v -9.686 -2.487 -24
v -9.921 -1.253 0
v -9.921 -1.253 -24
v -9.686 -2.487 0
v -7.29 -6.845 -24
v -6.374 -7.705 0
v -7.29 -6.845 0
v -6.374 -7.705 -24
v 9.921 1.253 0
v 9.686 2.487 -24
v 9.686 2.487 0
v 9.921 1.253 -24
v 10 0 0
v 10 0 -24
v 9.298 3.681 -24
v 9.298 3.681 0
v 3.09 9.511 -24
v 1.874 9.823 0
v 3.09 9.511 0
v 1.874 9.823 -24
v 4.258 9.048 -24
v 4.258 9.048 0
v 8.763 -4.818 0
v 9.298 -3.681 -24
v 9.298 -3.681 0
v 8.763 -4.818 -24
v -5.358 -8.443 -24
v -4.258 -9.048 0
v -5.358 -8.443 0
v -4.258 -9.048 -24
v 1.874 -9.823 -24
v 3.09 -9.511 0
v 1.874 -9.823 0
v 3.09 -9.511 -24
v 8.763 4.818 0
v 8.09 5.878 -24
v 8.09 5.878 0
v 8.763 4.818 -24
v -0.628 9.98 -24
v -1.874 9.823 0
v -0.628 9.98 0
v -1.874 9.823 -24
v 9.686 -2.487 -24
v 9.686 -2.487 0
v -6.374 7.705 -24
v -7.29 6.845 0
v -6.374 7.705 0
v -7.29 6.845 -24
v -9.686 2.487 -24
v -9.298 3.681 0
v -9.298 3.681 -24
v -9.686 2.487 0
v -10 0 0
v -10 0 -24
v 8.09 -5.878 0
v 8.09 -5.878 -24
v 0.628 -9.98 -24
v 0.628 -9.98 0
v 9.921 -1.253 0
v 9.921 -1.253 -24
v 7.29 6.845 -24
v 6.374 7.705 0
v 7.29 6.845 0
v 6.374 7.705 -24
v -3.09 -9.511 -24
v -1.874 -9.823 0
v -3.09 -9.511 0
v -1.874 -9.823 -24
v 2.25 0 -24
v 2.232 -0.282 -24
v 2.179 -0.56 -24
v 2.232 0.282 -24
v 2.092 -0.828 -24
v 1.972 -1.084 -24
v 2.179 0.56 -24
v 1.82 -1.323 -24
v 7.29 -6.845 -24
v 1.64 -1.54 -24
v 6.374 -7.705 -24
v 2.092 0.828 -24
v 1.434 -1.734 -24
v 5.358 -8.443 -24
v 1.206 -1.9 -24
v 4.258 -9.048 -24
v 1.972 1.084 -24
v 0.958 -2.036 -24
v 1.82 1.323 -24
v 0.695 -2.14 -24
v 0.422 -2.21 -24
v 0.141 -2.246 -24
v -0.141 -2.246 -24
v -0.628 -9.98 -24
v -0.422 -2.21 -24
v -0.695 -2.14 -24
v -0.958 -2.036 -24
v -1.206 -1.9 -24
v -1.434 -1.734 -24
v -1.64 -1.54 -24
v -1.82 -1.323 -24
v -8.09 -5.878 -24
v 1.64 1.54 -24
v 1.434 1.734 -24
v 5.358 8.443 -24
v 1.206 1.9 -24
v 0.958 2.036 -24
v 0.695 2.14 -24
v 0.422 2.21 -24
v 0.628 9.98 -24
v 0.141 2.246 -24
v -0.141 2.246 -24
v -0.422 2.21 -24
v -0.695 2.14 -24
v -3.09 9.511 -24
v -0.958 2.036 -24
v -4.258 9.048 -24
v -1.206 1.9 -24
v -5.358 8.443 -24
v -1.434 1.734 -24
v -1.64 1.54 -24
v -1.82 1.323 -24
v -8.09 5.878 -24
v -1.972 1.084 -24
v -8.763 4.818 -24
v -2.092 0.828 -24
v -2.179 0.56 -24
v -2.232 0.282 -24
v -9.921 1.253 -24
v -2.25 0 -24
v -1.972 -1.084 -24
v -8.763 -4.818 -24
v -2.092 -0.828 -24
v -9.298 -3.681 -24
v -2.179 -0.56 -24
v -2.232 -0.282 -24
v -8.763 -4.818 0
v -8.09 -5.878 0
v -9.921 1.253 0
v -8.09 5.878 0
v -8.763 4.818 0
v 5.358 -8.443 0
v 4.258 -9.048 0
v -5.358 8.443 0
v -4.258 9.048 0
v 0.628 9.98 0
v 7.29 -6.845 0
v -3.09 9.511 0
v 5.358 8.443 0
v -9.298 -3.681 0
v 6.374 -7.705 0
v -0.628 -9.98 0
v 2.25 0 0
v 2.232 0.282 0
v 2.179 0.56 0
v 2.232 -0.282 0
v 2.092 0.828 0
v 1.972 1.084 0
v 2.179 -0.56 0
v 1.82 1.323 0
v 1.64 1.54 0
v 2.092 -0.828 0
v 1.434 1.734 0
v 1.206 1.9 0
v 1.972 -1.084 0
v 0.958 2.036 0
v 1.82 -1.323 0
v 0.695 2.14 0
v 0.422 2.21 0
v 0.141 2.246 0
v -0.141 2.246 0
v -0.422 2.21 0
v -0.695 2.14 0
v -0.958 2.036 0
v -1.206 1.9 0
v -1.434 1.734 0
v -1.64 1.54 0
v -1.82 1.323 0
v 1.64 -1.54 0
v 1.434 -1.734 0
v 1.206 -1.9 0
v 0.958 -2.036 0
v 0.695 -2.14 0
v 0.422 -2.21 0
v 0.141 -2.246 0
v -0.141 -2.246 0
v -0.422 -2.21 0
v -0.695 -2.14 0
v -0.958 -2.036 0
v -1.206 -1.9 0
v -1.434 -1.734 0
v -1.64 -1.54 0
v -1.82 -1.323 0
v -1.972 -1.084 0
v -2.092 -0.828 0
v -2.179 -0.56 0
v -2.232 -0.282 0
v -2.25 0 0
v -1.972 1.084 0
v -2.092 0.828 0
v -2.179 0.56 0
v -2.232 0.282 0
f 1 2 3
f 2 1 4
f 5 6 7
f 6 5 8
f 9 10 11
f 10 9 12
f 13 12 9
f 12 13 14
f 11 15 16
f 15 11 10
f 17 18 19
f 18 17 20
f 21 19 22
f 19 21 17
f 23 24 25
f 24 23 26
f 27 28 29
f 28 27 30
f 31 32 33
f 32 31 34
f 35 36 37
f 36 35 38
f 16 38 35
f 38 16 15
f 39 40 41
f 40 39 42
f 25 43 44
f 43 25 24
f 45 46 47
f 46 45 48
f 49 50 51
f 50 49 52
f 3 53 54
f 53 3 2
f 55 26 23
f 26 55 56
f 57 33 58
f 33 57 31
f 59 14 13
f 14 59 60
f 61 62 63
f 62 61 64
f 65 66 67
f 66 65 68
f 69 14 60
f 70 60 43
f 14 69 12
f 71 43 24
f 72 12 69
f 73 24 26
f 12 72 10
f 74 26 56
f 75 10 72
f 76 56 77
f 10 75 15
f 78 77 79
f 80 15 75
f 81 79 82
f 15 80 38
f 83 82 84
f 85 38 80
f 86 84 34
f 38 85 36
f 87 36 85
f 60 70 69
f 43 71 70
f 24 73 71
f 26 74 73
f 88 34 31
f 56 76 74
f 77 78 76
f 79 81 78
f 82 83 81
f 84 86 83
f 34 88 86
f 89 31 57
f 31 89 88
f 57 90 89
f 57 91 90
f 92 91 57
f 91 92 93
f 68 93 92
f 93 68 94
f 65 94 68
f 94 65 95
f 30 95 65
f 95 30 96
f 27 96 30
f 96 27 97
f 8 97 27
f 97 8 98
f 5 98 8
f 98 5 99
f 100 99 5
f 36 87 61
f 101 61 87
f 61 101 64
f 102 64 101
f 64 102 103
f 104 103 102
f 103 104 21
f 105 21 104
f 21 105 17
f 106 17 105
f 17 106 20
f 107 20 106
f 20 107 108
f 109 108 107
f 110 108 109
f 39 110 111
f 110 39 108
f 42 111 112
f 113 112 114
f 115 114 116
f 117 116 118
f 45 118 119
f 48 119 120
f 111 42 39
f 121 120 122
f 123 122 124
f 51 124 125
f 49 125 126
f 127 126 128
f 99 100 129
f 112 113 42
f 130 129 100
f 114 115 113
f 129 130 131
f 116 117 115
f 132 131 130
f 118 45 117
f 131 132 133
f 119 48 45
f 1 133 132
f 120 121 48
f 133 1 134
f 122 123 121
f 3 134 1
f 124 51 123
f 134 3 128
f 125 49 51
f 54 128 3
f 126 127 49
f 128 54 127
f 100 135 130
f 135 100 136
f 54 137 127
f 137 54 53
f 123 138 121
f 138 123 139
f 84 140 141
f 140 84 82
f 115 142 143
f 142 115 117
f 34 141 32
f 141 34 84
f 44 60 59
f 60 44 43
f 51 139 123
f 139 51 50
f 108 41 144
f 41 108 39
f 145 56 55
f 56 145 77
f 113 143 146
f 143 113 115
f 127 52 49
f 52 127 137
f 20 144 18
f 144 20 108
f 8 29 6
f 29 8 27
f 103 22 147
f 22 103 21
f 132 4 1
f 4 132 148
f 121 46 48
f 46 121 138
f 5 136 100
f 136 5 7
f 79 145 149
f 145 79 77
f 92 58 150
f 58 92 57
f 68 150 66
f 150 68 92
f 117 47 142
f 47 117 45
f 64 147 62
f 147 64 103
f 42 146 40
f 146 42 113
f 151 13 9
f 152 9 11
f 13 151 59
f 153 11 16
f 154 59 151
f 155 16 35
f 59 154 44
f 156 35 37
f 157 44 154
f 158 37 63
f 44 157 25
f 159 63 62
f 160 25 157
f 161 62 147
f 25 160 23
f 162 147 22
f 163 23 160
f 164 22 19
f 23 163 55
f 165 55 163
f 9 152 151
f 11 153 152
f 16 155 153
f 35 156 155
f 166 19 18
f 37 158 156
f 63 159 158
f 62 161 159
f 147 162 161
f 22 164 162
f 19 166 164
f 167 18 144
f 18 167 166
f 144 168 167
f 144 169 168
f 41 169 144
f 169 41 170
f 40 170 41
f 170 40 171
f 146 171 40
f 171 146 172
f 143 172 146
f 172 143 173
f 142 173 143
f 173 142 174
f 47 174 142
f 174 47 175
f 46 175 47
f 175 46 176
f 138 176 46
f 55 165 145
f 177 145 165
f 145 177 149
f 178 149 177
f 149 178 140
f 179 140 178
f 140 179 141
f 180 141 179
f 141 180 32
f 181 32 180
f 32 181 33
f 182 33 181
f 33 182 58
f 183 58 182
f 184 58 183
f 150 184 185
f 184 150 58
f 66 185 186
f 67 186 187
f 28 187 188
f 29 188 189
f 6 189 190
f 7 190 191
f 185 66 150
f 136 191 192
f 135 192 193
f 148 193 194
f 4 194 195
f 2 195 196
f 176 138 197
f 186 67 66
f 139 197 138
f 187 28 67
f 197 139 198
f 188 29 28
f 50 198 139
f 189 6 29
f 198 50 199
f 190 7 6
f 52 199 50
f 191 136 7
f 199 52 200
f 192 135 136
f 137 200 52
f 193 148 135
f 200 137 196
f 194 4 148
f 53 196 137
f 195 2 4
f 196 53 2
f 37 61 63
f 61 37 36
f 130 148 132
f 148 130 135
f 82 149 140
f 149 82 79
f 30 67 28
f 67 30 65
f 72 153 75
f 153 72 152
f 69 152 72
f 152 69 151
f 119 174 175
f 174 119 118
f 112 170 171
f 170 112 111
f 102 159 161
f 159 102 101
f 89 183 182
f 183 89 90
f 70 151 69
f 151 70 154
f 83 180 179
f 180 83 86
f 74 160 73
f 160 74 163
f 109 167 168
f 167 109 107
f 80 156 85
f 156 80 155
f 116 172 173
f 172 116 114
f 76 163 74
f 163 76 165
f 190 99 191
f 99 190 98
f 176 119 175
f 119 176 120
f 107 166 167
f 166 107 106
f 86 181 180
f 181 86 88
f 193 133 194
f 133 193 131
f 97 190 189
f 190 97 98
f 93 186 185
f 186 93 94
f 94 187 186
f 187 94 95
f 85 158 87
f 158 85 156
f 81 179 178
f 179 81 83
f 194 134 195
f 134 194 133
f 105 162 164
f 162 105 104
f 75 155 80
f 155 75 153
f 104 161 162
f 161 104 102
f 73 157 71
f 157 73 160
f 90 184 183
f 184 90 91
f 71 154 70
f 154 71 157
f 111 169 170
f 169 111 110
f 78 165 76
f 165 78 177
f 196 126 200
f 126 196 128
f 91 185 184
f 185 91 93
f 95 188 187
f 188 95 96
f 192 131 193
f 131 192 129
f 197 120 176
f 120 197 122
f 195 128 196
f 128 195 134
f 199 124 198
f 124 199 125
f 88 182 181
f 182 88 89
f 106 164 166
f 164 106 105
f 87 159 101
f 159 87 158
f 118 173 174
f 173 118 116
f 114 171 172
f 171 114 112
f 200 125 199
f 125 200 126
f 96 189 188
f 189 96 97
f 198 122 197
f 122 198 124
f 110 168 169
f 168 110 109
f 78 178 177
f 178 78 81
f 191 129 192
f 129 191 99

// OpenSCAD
$fn = 50;


difference() {
	union() {
		translate(v = [0, 0, -24.0000000000]) {
			cylinder(h = 24, r = 10.0000000000);
		}
		cylinder(h = 0, r = 16.0000000000);
	}
	union() {
		#translate(v = [0, 0, -24]) {
			cylinder(h = 24, r = 2.2500000000);
		}
	}
}
